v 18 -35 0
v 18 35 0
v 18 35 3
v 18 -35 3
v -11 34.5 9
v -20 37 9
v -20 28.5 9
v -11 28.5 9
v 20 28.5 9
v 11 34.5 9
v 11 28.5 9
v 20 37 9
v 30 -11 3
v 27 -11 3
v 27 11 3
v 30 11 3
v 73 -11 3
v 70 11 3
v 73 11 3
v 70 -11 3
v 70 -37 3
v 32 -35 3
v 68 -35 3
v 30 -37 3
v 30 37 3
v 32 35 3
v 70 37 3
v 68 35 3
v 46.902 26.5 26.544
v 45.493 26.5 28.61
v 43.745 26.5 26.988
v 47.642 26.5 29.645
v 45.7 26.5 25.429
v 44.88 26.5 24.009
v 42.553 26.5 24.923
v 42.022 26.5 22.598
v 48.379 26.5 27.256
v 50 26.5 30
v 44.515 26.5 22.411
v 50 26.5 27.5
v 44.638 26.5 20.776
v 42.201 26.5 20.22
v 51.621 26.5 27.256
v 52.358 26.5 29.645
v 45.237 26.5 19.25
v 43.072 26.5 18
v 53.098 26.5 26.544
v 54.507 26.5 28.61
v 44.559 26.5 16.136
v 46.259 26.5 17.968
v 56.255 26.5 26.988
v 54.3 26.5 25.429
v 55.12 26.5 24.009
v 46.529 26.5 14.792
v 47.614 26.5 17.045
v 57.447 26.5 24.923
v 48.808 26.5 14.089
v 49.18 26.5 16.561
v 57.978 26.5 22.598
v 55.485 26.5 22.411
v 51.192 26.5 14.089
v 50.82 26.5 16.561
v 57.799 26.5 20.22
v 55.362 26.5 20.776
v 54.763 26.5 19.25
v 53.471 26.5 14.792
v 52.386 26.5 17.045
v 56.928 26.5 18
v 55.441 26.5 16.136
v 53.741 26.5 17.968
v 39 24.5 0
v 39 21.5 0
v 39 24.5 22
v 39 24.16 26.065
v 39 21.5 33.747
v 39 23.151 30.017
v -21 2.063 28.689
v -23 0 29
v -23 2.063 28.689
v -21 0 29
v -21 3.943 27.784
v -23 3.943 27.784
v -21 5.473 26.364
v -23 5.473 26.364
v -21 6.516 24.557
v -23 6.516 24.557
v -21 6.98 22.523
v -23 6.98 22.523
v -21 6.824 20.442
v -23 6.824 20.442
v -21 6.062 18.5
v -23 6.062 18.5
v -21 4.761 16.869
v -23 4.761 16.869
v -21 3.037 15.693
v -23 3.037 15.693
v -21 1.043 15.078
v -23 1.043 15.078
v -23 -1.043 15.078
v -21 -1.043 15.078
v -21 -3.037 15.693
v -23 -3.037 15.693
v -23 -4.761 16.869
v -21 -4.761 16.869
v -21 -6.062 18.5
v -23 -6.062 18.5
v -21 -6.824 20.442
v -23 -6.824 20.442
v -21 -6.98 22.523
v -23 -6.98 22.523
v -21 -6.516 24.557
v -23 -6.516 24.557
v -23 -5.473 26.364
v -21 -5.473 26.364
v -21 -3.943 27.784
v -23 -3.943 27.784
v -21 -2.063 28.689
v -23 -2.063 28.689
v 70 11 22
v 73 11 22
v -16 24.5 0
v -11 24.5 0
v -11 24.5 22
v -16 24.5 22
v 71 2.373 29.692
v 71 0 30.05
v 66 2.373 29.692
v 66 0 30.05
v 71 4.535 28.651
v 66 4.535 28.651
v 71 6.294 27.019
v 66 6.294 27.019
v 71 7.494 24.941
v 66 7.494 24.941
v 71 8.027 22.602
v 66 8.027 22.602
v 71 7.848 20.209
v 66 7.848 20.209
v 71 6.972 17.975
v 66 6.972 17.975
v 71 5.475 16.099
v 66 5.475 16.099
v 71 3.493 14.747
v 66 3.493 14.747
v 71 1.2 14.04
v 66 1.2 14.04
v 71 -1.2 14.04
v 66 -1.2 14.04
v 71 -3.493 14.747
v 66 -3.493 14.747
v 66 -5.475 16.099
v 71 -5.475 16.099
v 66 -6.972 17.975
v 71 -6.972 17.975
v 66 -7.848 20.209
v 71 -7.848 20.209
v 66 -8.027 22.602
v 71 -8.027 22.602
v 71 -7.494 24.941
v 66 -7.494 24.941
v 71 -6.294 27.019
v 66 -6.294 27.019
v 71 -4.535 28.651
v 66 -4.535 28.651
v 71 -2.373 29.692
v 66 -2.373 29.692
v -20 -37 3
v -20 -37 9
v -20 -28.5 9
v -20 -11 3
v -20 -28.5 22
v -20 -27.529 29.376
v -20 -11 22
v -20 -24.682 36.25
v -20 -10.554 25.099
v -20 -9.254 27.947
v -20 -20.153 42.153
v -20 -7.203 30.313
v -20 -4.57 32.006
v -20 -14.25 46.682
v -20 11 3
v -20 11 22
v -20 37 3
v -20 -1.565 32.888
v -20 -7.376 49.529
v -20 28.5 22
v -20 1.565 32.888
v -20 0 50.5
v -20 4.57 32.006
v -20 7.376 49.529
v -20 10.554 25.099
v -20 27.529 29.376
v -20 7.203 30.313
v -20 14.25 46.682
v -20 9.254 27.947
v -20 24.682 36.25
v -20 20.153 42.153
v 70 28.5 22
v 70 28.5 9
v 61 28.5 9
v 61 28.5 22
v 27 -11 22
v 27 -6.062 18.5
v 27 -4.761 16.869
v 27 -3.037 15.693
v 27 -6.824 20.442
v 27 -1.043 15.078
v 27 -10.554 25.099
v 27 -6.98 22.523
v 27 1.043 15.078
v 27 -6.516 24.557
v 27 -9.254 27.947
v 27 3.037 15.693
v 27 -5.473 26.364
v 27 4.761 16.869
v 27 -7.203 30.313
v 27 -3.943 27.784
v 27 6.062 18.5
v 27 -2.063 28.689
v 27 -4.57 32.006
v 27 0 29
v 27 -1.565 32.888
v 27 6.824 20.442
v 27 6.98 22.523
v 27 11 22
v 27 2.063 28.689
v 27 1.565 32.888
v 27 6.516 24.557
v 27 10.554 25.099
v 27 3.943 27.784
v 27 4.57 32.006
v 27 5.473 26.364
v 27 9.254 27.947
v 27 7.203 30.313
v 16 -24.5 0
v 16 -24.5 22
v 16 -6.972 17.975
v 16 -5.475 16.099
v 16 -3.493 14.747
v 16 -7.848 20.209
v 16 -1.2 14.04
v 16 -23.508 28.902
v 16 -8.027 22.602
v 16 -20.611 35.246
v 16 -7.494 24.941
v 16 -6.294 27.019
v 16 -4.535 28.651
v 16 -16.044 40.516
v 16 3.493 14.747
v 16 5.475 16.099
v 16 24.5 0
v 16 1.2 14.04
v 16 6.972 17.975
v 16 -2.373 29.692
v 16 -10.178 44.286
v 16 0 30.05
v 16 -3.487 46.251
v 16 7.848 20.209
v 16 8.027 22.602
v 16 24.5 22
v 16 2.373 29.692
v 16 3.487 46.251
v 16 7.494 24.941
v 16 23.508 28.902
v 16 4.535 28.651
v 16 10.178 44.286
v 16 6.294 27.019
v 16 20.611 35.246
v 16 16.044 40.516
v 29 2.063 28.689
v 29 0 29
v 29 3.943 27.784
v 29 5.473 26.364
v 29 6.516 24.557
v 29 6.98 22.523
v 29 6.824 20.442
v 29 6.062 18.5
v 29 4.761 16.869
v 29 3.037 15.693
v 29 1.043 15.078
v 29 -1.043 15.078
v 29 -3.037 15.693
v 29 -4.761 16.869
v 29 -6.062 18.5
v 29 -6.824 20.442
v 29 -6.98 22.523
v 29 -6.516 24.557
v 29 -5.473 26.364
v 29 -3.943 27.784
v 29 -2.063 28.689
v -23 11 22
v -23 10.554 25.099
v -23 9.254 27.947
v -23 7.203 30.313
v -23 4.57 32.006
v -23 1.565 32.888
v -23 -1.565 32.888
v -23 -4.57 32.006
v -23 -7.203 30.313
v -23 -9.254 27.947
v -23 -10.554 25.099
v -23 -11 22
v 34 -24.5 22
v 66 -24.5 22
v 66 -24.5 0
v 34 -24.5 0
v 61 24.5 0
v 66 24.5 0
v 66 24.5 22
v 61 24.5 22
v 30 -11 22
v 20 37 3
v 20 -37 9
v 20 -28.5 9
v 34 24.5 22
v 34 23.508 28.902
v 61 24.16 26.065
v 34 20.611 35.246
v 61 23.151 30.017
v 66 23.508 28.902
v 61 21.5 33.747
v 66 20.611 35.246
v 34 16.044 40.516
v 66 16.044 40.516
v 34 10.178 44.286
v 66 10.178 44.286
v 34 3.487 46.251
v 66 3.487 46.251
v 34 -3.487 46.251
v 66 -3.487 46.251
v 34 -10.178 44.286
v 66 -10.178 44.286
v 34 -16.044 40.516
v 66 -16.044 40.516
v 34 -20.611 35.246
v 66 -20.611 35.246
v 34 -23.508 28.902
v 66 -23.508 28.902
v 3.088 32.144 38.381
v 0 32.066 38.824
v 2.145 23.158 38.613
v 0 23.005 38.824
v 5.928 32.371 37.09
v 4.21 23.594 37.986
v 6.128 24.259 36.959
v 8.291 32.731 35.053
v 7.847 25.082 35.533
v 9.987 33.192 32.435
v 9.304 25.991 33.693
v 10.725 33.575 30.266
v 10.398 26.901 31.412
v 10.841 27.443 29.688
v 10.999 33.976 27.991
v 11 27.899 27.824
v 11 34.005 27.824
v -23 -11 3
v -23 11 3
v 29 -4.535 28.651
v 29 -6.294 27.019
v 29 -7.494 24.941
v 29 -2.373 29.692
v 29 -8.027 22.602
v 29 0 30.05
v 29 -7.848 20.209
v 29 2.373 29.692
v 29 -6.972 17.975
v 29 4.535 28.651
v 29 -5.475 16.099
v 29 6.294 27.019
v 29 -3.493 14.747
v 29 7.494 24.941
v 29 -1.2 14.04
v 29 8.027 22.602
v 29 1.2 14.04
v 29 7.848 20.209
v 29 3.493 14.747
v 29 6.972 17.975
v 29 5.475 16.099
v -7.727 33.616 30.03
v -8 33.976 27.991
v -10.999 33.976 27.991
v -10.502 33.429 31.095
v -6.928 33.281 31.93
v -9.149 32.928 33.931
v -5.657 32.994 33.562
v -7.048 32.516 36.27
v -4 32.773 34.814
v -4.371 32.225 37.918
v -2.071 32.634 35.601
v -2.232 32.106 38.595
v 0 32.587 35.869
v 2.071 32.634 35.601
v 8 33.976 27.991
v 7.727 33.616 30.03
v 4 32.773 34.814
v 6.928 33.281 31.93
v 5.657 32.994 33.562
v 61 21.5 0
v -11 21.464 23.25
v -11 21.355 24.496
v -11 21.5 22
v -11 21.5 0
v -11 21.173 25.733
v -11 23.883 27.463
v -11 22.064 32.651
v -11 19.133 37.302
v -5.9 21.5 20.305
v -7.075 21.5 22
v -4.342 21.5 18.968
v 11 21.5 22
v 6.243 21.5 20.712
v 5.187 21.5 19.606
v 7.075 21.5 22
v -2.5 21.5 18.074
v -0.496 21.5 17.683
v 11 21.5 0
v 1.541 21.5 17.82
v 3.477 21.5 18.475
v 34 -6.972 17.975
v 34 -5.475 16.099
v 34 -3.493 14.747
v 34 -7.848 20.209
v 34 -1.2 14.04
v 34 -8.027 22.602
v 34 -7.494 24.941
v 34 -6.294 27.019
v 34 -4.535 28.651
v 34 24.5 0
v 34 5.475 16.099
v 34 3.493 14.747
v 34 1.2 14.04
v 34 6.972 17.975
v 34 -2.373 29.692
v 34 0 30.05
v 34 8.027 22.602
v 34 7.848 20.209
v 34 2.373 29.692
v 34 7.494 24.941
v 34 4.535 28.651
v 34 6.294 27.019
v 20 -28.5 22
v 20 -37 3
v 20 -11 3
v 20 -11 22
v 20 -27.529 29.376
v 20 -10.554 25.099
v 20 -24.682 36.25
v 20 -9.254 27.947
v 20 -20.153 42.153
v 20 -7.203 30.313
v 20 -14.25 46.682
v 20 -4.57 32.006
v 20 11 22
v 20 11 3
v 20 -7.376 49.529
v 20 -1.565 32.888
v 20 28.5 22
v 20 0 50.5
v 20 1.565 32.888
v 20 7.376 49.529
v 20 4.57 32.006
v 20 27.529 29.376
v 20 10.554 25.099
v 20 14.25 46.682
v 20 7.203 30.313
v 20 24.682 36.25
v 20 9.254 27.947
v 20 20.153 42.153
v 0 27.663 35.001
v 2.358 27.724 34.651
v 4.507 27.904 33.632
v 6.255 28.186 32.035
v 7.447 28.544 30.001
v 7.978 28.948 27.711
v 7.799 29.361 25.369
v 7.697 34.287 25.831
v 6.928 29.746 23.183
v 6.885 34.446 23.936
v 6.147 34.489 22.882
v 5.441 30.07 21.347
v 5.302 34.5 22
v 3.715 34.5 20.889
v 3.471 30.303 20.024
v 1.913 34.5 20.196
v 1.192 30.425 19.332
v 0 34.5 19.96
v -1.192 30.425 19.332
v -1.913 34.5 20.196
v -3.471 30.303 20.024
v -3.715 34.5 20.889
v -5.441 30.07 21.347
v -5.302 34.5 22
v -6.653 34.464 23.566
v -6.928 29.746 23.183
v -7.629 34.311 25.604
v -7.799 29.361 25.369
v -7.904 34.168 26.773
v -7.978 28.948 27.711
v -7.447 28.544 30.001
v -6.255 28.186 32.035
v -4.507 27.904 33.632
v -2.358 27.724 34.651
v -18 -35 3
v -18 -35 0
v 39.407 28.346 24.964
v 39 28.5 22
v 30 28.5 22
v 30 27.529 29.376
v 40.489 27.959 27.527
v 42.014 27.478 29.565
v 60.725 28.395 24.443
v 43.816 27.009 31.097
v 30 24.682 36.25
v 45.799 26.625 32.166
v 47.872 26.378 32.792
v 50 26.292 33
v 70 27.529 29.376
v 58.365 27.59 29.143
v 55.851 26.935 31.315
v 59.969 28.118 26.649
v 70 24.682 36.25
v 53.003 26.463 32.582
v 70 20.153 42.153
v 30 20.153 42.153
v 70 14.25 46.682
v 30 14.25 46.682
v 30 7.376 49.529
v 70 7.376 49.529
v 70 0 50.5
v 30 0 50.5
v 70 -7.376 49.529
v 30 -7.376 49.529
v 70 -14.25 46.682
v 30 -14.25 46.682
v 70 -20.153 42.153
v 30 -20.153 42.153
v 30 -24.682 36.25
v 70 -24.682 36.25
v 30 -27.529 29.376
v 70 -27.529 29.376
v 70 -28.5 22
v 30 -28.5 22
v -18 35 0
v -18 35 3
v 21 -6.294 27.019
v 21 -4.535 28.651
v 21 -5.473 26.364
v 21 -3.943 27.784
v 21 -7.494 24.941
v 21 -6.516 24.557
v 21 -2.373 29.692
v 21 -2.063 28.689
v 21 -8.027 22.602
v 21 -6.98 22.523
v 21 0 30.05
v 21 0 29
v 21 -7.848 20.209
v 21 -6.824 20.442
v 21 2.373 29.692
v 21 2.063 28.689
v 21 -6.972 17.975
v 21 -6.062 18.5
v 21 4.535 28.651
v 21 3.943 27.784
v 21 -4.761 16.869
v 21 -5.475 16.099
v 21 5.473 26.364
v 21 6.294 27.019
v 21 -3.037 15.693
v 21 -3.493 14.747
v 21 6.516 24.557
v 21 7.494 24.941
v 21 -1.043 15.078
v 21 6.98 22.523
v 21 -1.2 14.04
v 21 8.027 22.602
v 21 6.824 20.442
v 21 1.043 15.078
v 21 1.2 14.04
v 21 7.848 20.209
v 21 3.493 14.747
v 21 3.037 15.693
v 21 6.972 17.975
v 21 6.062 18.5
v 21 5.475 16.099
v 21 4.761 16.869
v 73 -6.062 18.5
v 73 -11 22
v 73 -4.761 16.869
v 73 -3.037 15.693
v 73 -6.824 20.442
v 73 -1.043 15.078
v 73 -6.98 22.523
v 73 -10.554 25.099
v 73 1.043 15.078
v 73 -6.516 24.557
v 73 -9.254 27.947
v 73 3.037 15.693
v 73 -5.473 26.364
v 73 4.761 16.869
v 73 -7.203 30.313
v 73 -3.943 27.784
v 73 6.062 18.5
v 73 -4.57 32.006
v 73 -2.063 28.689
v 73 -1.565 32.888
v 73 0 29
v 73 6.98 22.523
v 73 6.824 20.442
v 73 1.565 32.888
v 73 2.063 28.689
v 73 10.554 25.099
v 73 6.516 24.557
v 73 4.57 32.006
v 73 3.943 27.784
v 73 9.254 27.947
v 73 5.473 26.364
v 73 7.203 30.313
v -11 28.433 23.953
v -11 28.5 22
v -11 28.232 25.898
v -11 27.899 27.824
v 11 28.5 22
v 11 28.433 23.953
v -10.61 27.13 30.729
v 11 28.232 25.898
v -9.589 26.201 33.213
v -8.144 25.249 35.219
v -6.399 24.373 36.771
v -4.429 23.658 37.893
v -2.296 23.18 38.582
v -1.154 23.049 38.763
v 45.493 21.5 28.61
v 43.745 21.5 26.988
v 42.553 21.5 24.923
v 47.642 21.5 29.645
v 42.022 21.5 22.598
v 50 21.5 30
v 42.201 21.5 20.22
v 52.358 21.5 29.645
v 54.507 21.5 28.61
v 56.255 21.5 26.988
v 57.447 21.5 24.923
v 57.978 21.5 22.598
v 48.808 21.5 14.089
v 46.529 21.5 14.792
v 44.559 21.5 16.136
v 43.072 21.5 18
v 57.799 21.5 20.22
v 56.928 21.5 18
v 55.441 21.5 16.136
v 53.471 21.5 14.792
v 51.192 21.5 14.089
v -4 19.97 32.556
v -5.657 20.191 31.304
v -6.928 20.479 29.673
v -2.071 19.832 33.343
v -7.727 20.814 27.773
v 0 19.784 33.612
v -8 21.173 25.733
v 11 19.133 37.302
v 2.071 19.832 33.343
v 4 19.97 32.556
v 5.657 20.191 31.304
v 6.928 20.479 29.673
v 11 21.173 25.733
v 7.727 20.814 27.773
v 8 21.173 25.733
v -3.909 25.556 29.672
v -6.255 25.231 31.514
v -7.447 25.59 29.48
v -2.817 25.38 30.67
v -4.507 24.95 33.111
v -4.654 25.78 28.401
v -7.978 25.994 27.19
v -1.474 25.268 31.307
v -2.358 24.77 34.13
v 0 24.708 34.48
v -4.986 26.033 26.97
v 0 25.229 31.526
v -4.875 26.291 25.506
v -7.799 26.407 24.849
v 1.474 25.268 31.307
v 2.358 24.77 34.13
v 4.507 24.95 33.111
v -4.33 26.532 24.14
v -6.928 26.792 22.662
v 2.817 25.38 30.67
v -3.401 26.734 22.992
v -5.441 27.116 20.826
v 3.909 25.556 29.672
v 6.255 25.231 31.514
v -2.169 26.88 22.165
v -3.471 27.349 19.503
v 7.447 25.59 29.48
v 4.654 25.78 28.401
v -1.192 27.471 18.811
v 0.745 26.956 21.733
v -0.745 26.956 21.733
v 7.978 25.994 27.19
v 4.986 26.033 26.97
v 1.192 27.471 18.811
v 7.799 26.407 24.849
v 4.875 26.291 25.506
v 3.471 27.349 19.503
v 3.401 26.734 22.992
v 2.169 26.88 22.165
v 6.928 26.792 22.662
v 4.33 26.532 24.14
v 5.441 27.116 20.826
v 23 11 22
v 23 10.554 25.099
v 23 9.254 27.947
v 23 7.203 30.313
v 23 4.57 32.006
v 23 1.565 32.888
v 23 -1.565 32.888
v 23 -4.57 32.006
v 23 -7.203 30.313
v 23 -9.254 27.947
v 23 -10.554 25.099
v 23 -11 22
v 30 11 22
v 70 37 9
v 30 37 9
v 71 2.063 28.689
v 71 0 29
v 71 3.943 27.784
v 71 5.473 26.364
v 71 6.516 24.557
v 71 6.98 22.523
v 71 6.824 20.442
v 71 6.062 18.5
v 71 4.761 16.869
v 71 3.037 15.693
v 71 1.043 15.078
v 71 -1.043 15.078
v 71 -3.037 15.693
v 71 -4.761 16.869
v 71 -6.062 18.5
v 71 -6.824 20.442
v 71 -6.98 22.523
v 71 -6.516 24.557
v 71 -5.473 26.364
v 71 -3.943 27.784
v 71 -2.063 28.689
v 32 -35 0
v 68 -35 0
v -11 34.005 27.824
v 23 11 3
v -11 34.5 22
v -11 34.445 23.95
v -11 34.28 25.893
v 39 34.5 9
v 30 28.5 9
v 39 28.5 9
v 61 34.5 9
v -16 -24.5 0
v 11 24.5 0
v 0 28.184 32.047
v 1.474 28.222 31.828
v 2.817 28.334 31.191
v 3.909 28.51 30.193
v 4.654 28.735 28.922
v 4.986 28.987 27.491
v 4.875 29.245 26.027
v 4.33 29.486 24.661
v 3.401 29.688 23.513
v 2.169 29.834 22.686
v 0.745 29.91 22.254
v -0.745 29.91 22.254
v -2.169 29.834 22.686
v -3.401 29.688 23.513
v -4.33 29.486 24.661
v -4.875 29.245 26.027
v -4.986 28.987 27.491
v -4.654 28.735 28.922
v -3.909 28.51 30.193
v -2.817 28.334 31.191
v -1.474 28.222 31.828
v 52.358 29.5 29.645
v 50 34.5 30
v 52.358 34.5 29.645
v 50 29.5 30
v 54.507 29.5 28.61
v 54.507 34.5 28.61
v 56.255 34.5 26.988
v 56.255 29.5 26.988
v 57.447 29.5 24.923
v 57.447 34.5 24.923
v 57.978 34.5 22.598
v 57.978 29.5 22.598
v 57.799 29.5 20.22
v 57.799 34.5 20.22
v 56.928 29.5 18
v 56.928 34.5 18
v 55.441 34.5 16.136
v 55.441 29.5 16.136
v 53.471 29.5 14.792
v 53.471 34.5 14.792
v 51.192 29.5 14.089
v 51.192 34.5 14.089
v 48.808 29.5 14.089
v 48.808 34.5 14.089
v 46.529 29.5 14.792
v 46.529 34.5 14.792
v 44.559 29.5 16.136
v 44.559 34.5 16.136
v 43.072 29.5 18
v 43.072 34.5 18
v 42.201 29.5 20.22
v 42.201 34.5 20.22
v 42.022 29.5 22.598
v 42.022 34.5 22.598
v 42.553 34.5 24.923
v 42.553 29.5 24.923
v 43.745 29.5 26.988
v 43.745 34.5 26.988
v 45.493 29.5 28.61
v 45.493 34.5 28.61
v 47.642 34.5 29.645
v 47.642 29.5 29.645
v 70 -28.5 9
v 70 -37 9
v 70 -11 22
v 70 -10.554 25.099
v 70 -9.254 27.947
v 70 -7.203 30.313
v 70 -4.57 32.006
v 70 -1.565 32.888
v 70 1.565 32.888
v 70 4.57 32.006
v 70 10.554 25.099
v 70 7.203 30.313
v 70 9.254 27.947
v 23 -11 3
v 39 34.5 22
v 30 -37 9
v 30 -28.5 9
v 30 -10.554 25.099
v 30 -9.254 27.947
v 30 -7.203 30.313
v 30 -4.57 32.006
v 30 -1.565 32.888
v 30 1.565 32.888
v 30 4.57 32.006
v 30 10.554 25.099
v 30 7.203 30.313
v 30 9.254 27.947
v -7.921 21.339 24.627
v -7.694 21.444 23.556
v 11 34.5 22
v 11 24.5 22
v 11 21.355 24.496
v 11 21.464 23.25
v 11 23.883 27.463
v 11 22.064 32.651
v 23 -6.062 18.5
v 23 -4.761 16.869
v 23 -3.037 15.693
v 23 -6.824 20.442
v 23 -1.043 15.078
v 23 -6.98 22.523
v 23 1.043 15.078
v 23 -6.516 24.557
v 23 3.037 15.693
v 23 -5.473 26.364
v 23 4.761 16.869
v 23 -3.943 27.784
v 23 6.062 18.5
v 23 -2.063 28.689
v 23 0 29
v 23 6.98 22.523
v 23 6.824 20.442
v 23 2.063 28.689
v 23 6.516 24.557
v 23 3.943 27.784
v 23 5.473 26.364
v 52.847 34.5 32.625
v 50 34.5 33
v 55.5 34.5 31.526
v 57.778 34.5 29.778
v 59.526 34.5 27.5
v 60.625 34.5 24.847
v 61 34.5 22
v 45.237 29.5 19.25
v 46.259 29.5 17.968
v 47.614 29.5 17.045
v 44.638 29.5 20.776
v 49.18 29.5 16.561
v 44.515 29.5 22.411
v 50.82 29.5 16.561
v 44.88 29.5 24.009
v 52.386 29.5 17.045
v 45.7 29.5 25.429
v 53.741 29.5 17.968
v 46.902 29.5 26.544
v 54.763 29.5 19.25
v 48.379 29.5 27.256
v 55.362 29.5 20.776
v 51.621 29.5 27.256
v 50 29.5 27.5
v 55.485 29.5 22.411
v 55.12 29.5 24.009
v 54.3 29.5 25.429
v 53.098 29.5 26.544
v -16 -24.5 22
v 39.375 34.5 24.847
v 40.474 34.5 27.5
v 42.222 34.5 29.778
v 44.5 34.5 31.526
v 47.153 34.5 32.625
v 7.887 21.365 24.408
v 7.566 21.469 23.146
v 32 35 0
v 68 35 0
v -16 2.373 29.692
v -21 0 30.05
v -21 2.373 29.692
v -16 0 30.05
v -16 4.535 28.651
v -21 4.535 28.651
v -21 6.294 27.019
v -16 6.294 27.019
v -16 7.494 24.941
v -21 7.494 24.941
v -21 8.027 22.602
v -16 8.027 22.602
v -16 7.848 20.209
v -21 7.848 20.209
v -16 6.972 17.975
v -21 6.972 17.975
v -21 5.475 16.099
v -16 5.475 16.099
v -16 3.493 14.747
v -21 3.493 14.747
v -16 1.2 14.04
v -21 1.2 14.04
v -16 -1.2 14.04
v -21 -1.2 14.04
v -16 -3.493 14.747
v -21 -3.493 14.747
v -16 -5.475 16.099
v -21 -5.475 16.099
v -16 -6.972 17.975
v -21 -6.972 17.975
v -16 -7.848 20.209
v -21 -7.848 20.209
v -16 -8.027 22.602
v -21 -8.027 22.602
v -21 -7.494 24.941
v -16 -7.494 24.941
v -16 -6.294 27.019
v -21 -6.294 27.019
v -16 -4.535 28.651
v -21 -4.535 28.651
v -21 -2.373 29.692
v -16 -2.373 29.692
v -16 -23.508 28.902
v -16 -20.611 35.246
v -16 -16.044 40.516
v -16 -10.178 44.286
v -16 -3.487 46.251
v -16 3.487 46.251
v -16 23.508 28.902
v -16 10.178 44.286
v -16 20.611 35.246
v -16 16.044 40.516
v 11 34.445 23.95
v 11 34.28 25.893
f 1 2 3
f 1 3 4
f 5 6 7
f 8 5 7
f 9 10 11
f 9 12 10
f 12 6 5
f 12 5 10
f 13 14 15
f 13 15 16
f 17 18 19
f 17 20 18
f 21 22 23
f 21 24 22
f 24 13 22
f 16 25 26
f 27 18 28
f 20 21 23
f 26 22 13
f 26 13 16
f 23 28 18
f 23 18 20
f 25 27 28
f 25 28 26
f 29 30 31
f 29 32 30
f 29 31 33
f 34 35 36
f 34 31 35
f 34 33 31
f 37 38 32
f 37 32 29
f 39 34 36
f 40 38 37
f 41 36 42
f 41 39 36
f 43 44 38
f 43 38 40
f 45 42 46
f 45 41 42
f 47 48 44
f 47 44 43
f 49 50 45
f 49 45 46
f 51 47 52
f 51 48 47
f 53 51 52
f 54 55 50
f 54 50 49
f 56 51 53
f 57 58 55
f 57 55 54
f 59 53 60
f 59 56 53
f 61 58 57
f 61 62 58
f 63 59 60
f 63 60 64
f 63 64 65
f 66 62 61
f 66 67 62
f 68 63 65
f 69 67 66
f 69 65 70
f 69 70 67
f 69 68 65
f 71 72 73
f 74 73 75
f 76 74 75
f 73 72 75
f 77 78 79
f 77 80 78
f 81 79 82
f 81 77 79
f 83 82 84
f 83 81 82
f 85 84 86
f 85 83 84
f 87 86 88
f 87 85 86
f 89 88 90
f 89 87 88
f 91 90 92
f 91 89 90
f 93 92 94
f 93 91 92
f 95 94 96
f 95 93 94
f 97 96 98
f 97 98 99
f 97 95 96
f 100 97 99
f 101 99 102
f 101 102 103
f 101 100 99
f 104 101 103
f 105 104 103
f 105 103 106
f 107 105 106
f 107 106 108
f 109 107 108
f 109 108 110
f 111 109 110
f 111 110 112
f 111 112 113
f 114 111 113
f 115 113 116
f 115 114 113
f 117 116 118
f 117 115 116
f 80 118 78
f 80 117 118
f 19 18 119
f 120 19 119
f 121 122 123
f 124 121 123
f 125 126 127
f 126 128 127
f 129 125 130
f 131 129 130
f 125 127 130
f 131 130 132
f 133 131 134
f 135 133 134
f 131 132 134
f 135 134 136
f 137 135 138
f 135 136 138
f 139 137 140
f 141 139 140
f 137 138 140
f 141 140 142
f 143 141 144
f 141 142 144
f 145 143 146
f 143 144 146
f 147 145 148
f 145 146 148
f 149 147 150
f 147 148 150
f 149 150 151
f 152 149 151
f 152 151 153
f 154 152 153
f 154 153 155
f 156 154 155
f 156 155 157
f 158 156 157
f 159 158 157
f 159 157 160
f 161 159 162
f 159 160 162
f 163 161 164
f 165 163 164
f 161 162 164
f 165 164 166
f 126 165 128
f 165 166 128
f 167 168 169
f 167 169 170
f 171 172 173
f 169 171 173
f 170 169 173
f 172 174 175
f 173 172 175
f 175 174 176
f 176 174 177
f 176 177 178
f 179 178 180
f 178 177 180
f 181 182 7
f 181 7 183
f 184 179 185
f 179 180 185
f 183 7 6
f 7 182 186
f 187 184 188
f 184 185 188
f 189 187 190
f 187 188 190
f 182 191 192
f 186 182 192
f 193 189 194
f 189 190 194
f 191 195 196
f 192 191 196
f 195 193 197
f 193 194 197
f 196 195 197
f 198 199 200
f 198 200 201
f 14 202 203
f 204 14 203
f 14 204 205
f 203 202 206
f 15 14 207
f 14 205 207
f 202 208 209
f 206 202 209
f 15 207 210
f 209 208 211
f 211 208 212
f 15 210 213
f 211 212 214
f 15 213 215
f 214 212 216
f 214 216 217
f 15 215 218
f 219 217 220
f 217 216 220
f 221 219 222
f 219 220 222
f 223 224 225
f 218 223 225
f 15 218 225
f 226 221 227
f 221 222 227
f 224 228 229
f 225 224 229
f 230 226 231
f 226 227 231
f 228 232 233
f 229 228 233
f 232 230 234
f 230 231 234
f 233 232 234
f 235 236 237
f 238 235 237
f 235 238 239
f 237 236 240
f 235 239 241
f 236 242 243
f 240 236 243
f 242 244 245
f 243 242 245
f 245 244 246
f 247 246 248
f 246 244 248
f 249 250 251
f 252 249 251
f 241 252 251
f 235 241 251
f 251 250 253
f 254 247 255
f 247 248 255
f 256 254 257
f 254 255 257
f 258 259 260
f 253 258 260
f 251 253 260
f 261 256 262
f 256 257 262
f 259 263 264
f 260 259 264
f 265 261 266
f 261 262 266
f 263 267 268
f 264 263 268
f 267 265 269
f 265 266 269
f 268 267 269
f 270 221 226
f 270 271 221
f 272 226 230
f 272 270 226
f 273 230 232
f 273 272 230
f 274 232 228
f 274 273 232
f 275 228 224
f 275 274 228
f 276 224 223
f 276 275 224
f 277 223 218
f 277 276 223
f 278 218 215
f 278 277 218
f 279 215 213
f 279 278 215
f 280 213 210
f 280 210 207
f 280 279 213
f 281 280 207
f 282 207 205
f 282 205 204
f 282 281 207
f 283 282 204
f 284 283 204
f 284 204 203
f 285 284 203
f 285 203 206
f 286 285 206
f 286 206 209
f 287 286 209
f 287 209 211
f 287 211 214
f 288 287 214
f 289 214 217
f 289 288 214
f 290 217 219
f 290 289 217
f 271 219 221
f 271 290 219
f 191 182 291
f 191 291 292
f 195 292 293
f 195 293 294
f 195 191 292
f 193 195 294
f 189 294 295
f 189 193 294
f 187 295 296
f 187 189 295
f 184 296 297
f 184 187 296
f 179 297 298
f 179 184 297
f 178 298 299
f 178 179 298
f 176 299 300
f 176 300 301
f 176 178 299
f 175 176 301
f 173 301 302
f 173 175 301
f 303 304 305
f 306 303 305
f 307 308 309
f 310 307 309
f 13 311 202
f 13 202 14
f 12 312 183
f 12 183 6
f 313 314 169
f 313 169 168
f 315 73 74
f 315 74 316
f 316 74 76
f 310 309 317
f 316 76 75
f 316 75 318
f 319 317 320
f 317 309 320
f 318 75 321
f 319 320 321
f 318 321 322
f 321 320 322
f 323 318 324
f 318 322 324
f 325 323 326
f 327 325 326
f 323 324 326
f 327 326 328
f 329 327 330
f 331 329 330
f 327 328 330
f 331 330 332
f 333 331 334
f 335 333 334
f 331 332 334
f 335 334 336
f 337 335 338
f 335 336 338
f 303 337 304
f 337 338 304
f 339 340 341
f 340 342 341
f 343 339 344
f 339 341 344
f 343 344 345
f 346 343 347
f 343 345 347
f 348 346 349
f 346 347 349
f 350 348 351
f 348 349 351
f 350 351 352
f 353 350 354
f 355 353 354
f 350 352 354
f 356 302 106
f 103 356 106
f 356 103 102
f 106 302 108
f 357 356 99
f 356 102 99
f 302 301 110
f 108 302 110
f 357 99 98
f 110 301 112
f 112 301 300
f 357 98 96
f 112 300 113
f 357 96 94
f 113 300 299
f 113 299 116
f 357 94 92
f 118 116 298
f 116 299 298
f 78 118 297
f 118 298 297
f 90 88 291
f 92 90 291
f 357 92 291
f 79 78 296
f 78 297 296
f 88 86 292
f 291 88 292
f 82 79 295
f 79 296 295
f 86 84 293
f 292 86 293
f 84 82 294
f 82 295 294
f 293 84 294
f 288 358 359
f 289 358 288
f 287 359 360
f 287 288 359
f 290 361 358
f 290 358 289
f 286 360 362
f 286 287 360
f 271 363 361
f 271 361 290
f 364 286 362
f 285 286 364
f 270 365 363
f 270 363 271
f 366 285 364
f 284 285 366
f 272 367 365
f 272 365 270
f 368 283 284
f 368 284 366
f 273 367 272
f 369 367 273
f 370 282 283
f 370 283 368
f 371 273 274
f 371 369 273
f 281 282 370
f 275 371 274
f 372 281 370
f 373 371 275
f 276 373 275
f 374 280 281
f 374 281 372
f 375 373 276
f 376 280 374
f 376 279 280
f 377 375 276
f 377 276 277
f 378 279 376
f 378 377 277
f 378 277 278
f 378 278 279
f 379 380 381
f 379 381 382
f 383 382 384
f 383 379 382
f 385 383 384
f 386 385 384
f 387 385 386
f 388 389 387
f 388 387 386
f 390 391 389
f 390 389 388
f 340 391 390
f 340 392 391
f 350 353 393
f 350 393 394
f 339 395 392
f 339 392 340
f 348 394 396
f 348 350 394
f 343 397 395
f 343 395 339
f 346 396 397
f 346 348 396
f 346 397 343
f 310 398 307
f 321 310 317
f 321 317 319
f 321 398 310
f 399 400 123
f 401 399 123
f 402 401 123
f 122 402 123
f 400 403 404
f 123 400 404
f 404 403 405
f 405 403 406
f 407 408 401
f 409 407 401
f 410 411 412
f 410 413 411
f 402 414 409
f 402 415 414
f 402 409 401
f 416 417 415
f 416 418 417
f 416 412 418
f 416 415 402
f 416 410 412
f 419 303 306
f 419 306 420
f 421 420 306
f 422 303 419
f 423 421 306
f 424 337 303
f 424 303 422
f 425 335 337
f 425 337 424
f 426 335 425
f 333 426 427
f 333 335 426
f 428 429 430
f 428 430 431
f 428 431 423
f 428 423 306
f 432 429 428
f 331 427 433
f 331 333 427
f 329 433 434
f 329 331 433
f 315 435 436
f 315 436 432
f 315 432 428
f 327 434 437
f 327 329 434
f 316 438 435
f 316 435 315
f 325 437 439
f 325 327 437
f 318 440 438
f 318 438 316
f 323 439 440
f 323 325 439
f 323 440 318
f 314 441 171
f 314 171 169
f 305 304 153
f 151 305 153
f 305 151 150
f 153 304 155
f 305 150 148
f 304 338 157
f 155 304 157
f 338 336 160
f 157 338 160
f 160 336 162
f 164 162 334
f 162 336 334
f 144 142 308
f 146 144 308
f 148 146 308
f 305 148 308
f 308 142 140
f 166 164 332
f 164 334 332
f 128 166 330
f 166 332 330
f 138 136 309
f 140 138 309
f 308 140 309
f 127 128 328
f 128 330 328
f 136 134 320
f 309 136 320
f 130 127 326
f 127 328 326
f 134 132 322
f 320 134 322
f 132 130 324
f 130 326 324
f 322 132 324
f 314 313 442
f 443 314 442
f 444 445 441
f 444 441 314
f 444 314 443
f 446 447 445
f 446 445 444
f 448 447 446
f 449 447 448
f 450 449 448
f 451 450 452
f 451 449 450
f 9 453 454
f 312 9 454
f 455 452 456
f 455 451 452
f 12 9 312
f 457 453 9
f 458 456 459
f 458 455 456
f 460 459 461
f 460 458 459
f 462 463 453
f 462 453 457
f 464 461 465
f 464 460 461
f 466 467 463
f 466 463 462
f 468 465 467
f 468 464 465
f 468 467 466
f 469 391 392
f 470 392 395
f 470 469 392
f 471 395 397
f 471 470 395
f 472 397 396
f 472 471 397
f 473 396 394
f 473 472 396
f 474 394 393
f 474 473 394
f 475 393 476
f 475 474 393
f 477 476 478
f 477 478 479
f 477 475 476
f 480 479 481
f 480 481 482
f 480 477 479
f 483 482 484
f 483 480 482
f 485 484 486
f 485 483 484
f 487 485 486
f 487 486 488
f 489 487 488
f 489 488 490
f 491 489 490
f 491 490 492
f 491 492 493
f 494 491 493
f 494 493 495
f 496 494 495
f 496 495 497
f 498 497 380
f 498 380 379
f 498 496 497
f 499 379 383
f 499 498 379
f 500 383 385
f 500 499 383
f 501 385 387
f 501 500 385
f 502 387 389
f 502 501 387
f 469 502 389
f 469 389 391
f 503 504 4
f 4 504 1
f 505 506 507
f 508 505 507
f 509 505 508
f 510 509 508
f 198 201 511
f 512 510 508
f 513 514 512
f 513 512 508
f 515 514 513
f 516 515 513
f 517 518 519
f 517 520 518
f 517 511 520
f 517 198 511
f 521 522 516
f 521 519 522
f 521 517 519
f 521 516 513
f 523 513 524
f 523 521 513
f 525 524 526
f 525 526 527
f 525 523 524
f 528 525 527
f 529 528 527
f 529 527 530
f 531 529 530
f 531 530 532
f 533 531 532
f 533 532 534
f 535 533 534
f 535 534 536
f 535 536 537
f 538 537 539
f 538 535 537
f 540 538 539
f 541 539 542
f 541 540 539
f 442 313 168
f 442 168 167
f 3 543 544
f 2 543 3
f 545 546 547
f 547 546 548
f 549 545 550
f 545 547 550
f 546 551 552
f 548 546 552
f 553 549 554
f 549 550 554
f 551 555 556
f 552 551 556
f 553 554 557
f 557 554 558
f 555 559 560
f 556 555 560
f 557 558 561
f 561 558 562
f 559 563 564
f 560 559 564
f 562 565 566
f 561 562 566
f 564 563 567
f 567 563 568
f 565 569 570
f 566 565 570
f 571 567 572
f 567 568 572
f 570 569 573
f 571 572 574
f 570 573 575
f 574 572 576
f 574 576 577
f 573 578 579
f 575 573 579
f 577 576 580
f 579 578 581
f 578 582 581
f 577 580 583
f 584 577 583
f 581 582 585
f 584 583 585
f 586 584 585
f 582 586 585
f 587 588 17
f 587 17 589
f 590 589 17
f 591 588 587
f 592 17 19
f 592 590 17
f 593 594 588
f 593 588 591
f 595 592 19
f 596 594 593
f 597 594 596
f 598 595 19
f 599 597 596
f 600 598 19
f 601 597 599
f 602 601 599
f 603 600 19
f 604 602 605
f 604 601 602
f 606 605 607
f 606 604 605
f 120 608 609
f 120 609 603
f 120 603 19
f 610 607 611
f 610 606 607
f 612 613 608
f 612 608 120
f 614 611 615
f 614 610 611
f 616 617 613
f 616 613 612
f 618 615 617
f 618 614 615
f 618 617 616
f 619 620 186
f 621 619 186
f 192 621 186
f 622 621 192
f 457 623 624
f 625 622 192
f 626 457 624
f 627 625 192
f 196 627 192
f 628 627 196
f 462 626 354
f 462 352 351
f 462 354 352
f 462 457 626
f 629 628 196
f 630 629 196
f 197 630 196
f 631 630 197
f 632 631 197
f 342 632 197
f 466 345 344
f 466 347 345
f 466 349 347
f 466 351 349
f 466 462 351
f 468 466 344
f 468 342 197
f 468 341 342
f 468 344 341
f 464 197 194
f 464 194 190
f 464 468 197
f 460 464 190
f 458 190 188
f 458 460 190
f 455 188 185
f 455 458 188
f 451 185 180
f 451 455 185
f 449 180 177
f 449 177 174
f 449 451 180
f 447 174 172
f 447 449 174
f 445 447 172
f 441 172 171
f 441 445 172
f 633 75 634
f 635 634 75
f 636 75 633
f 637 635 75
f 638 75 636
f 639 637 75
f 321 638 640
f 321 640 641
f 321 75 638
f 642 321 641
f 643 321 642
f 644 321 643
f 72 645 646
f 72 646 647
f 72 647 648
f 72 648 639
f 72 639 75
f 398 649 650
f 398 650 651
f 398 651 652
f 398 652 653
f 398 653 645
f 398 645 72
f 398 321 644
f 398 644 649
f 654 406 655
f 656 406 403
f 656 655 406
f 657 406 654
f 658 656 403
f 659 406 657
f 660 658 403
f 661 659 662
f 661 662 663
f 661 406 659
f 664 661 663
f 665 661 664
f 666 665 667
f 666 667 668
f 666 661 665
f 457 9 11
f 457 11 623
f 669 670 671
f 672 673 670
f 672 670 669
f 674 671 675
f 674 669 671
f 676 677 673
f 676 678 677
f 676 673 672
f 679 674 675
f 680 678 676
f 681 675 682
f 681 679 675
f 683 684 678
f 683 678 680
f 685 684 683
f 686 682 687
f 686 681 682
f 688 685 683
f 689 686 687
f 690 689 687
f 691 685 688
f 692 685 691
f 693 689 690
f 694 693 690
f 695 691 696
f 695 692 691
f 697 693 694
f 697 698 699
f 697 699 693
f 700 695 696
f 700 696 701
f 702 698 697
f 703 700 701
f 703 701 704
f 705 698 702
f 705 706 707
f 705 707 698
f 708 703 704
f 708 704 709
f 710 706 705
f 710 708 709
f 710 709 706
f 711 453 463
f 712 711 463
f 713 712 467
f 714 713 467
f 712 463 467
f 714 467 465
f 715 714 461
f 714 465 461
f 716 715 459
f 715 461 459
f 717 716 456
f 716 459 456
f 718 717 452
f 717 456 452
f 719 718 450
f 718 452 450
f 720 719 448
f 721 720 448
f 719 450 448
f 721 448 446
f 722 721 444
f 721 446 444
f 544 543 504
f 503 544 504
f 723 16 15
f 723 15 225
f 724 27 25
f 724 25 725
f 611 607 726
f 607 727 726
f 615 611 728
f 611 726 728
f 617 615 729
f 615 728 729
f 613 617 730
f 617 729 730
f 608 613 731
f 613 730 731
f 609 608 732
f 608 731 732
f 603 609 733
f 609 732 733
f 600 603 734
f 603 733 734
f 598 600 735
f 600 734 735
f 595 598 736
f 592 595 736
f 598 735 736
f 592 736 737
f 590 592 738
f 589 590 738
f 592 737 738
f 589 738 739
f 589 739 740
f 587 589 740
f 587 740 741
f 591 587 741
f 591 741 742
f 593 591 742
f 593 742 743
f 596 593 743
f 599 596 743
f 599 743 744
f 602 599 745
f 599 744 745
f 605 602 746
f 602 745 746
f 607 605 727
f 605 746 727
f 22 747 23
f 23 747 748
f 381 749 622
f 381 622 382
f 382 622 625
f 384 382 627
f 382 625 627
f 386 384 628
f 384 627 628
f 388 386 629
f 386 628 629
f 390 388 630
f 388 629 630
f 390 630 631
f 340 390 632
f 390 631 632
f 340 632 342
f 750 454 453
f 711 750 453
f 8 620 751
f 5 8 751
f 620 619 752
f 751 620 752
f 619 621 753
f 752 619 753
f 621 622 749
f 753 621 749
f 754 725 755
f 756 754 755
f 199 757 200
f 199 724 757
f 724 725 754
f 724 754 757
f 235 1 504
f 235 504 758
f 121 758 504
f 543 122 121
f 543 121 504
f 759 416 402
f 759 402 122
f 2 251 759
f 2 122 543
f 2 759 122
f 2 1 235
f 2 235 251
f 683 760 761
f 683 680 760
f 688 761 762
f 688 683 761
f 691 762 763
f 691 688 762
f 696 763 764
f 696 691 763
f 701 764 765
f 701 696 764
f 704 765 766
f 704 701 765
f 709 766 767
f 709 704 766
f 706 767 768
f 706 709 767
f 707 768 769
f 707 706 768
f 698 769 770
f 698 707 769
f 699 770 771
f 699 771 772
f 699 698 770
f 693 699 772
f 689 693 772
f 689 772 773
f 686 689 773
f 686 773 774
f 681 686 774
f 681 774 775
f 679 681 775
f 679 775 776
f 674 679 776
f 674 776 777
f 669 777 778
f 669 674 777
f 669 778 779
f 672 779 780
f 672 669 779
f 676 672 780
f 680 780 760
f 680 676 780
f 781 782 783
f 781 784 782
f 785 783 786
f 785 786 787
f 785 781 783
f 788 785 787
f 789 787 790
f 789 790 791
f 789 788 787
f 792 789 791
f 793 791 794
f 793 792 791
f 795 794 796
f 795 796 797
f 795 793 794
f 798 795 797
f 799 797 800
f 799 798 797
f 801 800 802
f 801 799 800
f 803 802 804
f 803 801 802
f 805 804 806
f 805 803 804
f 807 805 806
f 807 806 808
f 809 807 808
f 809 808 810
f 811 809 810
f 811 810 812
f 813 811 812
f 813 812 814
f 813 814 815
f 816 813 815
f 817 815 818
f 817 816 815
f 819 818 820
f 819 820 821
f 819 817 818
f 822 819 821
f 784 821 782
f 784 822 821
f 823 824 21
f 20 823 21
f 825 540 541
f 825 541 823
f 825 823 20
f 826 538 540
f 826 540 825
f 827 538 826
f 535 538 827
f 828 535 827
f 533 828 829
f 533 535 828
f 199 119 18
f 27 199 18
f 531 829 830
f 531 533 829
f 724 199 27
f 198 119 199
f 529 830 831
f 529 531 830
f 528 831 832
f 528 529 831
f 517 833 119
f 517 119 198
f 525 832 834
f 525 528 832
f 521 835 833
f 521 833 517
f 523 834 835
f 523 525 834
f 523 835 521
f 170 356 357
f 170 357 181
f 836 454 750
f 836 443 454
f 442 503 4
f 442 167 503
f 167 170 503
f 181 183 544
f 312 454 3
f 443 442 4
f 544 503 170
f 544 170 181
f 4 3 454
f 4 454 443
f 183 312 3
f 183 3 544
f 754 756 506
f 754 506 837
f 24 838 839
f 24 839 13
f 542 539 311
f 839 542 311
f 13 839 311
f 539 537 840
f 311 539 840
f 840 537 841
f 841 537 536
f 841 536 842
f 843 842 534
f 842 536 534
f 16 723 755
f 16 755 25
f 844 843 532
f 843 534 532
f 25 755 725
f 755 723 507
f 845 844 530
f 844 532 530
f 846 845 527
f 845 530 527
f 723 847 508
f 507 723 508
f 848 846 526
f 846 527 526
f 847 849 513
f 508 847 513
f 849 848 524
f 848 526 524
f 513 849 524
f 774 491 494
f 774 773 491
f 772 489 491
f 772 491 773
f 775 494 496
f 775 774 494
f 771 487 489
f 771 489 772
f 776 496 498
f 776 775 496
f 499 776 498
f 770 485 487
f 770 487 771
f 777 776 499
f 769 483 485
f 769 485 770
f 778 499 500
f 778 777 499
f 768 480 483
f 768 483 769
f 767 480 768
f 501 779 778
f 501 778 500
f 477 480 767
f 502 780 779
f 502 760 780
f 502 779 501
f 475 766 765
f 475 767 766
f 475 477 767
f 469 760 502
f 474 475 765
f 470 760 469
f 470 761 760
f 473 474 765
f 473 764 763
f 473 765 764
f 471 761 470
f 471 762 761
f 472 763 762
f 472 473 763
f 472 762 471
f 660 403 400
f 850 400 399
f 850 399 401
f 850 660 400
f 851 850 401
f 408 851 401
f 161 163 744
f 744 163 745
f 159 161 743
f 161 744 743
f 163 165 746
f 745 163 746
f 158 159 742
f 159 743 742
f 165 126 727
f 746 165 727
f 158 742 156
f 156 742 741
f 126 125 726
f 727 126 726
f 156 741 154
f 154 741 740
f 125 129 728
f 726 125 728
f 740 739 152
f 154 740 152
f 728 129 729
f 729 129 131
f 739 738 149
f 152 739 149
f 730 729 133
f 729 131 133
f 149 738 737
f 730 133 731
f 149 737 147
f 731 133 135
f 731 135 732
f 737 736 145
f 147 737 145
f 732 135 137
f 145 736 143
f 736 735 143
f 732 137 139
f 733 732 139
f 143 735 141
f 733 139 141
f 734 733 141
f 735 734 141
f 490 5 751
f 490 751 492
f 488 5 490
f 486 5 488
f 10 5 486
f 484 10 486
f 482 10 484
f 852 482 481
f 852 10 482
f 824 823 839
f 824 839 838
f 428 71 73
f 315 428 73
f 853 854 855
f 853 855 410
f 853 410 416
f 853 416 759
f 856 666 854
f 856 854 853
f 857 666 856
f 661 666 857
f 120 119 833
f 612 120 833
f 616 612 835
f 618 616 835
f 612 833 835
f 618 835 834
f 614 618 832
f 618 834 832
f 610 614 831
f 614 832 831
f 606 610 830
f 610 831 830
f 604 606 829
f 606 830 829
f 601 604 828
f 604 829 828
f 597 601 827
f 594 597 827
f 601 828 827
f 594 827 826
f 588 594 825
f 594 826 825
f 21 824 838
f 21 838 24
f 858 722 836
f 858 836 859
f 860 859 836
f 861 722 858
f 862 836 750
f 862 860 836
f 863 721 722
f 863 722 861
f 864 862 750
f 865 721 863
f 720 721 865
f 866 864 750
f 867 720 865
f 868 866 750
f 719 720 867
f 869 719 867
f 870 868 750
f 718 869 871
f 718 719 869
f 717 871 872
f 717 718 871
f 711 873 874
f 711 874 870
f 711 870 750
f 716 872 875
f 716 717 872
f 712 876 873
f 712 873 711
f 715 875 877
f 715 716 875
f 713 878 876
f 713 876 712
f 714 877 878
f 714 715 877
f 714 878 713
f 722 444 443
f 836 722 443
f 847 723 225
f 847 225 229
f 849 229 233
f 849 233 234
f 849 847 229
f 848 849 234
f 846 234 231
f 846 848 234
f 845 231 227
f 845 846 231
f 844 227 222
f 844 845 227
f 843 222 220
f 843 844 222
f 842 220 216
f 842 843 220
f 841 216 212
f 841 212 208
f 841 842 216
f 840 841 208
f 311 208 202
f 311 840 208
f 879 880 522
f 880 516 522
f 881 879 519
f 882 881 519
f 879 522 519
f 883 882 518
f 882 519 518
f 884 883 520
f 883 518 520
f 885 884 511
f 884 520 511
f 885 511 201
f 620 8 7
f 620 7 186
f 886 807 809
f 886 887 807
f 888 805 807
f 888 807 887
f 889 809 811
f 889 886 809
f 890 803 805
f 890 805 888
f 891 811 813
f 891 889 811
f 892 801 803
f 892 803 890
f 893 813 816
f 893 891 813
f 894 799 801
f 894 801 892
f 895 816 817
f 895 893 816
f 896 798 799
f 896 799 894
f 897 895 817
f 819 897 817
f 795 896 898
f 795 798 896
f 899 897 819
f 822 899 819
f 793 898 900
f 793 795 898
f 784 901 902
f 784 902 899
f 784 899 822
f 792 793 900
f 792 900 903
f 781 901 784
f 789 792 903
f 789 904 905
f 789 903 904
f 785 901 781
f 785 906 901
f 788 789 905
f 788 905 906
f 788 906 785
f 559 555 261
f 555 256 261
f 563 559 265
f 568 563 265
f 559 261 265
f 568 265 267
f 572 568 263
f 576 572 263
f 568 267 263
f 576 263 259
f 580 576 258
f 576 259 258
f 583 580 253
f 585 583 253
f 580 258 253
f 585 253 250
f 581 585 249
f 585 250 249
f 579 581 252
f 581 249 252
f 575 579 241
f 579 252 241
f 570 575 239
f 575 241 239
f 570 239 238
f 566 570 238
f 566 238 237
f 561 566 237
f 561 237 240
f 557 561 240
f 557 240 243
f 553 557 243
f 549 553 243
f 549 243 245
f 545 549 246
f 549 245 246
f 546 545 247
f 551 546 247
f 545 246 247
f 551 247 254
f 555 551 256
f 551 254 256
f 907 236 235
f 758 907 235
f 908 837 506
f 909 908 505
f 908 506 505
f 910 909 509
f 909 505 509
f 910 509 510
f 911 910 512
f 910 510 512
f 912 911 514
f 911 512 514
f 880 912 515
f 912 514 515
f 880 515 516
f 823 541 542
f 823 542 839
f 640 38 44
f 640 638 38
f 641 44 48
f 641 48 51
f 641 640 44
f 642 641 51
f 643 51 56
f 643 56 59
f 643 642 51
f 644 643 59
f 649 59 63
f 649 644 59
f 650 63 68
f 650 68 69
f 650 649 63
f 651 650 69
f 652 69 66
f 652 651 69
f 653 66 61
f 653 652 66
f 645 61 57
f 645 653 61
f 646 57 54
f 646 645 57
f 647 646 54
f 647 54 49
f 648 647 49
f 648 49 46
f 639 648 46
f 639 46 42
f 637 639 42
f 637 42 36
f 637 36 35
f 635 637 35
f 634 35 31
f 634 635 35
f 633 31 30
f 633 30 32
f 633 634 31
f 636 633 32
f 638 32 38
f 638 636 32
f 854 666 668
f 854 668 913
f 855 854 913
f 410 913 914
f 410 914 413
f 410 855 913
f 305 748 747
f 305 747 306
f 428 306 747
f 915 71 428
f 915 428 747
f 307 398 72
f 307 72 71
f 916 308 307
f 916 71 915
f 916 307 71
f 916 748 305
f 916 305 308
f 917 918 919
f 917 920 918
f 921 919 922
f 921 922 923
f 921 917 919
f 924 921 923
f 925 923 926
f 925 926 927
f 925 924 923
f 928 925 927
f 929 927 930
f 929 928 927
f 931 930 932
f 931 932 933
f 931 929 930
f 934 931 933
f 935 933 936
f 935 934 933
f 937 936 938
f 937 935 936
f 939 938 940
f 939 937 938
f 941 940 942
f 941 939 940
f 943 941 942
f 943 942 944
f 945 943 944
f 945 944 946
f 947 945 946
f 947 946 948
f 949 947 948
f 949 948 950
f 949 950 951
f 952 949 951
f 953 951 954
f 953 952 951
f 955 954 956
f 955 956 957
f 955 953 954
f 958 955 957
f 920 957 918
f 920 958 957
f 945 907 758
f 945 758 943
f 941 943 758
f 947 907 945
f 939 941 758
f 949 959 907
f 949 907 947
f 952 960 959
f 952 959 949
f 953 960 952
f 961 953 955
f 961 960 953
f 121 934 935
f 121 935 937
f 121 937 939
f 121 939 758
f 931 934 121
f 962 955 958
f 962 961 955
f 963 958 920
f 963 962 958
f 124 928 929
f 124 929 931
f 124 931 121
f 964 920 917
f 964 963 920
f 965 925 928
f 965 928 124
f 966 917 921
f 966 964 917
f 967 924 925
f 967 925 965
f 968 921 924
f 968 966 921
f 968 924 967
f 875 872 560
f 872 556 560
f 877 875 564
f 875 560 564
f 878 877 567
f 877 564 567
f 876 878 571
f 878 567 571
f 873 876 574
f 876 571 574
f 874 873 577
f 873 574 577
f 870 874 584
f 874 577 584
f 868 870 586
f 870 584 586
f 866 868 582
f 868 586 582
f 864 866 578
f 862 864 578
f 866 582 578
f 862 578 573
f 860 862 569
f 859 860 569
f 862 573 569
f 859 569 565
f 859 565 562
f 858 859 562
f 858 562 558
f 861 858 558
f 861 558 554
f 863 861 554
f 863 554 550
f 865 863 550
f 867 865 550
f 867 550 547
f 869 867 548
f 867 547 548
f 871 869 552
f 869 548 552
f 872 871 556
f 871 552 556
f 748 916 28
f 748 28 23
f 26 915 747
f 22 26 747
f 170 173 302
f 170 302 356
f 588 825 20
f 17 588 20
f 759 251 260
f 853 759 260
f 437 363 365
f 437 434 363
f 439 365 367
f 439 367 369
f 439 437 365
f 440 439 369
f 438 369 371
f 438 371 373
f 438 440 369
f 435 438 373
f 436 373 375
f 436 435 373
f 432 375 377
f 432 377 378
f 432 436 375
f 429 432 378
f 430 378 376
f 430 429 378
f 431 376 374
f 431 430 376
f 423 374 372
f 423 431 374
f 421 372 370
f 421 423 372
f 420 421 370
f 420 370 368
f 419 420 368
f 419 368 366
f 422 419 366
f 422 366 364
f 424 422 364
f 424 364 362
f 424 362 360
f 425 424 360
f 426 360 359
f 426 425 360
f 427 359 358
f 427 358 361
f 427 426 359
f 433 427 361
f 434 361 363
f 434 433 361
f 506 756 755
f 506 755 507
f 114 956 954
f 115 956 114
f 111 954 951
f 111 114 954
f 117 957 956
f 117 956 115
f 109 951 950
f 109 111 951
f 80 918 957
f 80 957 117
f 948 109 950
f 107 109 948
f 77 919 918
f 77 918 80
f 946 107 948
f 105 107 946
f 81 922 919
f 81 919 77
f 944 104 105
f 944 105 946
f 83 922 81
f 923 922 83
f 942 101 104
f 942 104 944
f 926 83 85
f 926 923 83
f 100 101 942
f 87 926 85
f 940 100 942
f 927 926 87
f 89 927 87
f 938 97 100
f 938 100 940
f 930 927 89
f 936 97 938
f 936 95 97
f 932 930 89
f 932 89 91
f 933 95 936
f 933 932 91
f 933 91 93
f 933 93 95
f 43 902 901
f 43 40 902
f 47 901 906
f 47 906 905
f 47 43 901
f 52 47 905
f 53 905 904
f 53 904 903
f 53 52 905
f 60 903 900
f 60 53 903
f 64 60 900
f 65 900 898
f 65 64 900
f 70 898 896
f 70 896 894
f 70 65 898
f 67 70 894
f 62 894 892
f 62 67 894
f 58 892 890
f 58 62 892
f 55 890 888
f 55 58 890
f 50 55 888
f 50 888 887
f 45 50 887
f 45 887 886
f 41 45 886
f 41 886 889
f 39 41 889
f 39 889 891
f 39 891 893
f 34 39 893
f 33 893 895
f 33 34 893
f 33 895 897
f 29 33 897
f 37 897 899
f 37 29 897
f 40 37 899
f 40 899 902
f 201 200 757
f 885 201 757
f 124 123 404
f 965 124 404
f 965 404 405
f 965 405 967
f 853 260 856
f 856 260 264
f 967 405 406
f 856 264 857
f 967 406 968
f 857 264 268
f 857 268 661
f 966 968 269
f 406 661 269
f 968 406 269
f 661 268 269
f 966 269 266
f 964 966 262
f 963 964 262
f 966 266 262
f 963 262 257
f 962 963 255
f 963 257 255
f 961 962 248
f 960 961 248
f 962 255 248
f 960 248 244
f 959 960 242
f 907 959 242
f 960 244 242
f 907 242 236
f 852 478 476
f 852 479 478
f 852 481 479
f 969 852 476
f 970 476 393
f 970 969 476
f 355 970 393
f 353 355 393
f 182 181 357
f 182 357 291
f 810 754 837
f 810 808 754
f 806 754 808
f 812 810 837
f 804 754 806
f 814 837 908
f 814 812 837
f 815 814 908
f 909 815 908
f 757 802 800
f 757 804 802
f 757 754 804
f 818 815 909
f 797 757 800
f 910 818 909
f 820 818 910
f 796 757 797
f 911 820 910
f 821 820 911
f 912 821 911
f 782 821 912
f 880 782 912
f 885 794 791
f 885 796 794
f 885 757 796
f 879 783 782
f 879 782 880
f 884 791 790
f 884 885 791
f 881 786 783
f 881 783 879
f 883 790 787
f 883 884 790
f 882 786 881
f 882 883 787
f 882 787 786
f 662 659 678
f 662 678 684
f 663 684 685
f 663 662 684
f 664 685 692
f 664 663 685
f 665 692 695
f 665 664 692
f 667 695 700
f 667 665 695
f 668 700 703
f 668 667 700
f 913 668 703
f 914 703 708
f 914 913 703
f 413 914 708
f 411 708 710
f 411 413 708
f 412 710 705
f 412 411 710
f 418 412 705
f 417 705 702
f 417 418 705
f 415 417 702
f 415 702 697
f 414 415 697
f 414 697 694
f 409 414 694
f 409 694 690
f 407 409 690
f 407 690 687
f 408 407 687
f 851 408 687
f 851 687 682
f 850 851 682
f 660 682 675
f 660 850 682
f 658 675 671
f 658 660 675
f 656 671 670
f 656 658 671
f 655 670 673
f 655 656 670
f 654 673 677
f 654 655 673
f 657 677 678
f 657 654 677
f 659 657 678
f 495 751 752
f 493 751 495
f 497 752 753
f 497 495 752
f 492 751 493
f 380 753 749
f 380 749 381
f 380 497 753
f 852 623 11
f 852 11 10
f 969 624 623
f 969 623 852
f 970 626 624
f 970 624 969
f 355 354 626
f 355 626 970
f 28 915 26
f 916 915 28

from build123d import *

# Parameters (mm, degrees)
F1_DEPTH  = 20
F3_DEPTH  = 16
F5_DEPTH  = 3
F8_W      = 36
F8_H      = 70
F9_DEPTH  = 3
F13_DEPTH = 11
F14_R     = 10.99999
F18_DEPTH = 11
F21_R     = 10.99999


# Not quite as in the source:
# - a fillet or chamfer is up to 0.001 mm smaller than in the source, because OpenCascade refuses the exact size
# - a pattern or mirror of a feature is missing from the dataset's text; its kind, count and spacing are read off the source's solid


with BuildPart() as f1:
    # F0 (on Right) → F1 (new body, symmetric)
    with BuildSketch(Plane.YZ):
        with BuildLine():
            Line((28.5, 9), (28.5, 22))
            ThreePointArc((28.5, 22), (0, 50.5), (-28.5, 22))
            Line((-28.5, 22), (-28.5, 9))
            Line((-28.5, 9), (-37, 9))
            Line((-37, 9), (-37, 0))
            Line((-37, 0), (37, 0))
            Line((37, 0), (37, 9))
            Line((37, 9), (28.5, 9))
        make_face()
    extrude(amount=F1_DEPTH, both=True)

    # F2 (on Right) → F3 (cut, symmetric)
    with BuildSketch(Plane.YZ):
        with BuildLine():
            Line((24.5, 0), (24.5, 22))
            ThreePointArc((24.5, 22), (0, 46.5), (-24.5, 22))
            Line((-24.5, 22), (-24.5, 0))
            Line((-24.5, 0), (24.5, 0))
        make_face()
    extrude(amount=F3_DEPTH, both=True, mode=Mode.SUBTRACT)

    # F4 (on face) → F5 (join)
    with BuildSketch(Plane.YZ.offset(20)):
        with BuildLine():
            Line((11, 0), (11, 22))
            ThreePointArc((11, 22), (0, 33), (-11, 22))
            Line((-11, 22), (-11, 0))
            Line((-11, 0), (11, 0))
        make_face()
    f5 = extrude(amount=F5_DEPTH)

    # F5_copies: F5 across plane
    add(f5.mirror(Plane(origin=(0, 0, 0), x_dir=(0, 0, -1), z_dir=(-1, 0, 0))))

    # F6 (on Front) → F7 (revolve, cut)
    with BuildSketch(Plane.XZ):
        Polygon((16, 30.05), (16, 22), (23, 22), (23, 29), (21, 29), (21, 30.05), align=None)
    f7 = revolve(axis=Axis((24.6842799243, 0, 22), (-1, 0, 0)), mode=Mode.SUBTRACT)

    # F7_copies: F7 across plane
    add(f7.mirror(Plane(origin=(0, 0, 0), x_dir=(0, 0, -1), z_dir=(-1, 0, 0))), mode=Mode.SUBTRACT)

    # F8 (on face) → F9 (cut)
    with BuildSketch(Plane(origin=(0, 0, 0), x_dir=(1, 0, 0), z_dir=(0, 0, -1))):
        Polygon((20, 37), (-20, 37), (-20, 11), (-23, 11), (-23, -11), (-20, -11), (-20, -37), (20, -37), (20, -11), (23, -11), (23, 11), (20, 11), align=None)
        Rectangle(F8_W, F8_H, mode=Mode.SUBTRACT)
    extrude(amount=-F9_DEPTH, mode=Mode.SUBTRACT)


with BuildPart() as f10_1:
    # F10: copy of F1
    add(f1.part.moved(Location((50, 0, 0))))

    # F12 (on mid) → F13 (join, symmetric)
    with BuildSketch(Plane.YZ.offset(50)):
        Polygon((21.5, 33), (21.5, 0), (34.5, 0), (34.5, 33), (24.8438753188, 33), (21.5, 34), align=None)
    extrude(amount=F13_DEPTH, both=True)

    # F14 (radius 11 in the source; OpenCascade refuses exactly that, so slightly less here)
    f14_edges = [f10_1.edges().sort_by_distance(p)[0] for p in [
        (61, 30.395817, 33),
        (39, 30.395817, 33),
    ]]
    fillet(f14_edges, radius=F14_R)

    # F15 (on mid) → F16 (revolve, cut)
    with BuildSketch(Plane.YZ.offset(50)):
        Polygon((21.5, 30), (21.5, 22), (34.5, 22), (34.5, 30), (29.5, 30), (29.5, 27.5), (26.5, 27.5), (26.5, 30), align=None)
    revolve(axis=Axis((50, 24.9189473689, 22), (0, 1, 0)), mode=Mode.SUBTRACT)


with BuildPart() as f1_1:
    add(f1.part)

    # F17 (on Right) → F18 (join, symmetric)
    with BuildSketch(Plane.YZ):
        with BuildLine():
            Line((21.5, 22), (21.5, 0))
            Line((21.5, 0), (34.5, 0))
            Line((34.5, 0), (34.5, 22))
            ThreePointArc((34.5, 22), (34.3687170842, 25.0068731248), (33.9758674789, 27.9908621295))
            Line((33.9758674789, 27.9908621295), (32.0657375246, 38.8237474126))
            Line((32.0657375246, 38.8237474126), (18.8651915701, 38.8237474126))
            Line((18.8651915701, 38.8237474126), (21.1733666898, 25.7334358198))
            ThreePointArc((21.1733666898, 25.7334358198), (21.418186009, 23.8738484691), (21.5, 22))
        make_face()
    extrude(amount=F18_DEPTH, both=True)

    # F19 (on Right) → F20 (revolve, cut)
    with BuildSketch(Plane.YZ):
        Polygon((27.6626432925, 35.0010832653), (28.1835878255, 32.0466600062), (25.2291645665, 31.5257154732), (24.7082200335, 34.4801387323), (19.7841812684, 33.6118978439), (16.8297580094, 33.0909533109), (18.2189434307, 25.2124912868), (21.1733666898, 25.7334358198), (33.9758674789, 27.9908621295), (32.5866820576, 35.8693241536), align=None)
    revolve(axis=Axis((0, 21.387808256, 25.7712476538), (0, 0.984807753, 0.1736481777)), mode=Mode.SUBTRACT)

    # F21 (radius 11 in the source; OpenCascade refuses exactly that, so slightly less here)
    f21_edges = [f1_1.edges().sort_by_distance(p)[0] for p in [
        (-11, 27.535168, 38.823747),
        (11, 27.535168, 38.823747),
    ]]
    fillet(f21_edges, radius=F21_R)


solid = Compound([f10_1.part, f1_1.part])
